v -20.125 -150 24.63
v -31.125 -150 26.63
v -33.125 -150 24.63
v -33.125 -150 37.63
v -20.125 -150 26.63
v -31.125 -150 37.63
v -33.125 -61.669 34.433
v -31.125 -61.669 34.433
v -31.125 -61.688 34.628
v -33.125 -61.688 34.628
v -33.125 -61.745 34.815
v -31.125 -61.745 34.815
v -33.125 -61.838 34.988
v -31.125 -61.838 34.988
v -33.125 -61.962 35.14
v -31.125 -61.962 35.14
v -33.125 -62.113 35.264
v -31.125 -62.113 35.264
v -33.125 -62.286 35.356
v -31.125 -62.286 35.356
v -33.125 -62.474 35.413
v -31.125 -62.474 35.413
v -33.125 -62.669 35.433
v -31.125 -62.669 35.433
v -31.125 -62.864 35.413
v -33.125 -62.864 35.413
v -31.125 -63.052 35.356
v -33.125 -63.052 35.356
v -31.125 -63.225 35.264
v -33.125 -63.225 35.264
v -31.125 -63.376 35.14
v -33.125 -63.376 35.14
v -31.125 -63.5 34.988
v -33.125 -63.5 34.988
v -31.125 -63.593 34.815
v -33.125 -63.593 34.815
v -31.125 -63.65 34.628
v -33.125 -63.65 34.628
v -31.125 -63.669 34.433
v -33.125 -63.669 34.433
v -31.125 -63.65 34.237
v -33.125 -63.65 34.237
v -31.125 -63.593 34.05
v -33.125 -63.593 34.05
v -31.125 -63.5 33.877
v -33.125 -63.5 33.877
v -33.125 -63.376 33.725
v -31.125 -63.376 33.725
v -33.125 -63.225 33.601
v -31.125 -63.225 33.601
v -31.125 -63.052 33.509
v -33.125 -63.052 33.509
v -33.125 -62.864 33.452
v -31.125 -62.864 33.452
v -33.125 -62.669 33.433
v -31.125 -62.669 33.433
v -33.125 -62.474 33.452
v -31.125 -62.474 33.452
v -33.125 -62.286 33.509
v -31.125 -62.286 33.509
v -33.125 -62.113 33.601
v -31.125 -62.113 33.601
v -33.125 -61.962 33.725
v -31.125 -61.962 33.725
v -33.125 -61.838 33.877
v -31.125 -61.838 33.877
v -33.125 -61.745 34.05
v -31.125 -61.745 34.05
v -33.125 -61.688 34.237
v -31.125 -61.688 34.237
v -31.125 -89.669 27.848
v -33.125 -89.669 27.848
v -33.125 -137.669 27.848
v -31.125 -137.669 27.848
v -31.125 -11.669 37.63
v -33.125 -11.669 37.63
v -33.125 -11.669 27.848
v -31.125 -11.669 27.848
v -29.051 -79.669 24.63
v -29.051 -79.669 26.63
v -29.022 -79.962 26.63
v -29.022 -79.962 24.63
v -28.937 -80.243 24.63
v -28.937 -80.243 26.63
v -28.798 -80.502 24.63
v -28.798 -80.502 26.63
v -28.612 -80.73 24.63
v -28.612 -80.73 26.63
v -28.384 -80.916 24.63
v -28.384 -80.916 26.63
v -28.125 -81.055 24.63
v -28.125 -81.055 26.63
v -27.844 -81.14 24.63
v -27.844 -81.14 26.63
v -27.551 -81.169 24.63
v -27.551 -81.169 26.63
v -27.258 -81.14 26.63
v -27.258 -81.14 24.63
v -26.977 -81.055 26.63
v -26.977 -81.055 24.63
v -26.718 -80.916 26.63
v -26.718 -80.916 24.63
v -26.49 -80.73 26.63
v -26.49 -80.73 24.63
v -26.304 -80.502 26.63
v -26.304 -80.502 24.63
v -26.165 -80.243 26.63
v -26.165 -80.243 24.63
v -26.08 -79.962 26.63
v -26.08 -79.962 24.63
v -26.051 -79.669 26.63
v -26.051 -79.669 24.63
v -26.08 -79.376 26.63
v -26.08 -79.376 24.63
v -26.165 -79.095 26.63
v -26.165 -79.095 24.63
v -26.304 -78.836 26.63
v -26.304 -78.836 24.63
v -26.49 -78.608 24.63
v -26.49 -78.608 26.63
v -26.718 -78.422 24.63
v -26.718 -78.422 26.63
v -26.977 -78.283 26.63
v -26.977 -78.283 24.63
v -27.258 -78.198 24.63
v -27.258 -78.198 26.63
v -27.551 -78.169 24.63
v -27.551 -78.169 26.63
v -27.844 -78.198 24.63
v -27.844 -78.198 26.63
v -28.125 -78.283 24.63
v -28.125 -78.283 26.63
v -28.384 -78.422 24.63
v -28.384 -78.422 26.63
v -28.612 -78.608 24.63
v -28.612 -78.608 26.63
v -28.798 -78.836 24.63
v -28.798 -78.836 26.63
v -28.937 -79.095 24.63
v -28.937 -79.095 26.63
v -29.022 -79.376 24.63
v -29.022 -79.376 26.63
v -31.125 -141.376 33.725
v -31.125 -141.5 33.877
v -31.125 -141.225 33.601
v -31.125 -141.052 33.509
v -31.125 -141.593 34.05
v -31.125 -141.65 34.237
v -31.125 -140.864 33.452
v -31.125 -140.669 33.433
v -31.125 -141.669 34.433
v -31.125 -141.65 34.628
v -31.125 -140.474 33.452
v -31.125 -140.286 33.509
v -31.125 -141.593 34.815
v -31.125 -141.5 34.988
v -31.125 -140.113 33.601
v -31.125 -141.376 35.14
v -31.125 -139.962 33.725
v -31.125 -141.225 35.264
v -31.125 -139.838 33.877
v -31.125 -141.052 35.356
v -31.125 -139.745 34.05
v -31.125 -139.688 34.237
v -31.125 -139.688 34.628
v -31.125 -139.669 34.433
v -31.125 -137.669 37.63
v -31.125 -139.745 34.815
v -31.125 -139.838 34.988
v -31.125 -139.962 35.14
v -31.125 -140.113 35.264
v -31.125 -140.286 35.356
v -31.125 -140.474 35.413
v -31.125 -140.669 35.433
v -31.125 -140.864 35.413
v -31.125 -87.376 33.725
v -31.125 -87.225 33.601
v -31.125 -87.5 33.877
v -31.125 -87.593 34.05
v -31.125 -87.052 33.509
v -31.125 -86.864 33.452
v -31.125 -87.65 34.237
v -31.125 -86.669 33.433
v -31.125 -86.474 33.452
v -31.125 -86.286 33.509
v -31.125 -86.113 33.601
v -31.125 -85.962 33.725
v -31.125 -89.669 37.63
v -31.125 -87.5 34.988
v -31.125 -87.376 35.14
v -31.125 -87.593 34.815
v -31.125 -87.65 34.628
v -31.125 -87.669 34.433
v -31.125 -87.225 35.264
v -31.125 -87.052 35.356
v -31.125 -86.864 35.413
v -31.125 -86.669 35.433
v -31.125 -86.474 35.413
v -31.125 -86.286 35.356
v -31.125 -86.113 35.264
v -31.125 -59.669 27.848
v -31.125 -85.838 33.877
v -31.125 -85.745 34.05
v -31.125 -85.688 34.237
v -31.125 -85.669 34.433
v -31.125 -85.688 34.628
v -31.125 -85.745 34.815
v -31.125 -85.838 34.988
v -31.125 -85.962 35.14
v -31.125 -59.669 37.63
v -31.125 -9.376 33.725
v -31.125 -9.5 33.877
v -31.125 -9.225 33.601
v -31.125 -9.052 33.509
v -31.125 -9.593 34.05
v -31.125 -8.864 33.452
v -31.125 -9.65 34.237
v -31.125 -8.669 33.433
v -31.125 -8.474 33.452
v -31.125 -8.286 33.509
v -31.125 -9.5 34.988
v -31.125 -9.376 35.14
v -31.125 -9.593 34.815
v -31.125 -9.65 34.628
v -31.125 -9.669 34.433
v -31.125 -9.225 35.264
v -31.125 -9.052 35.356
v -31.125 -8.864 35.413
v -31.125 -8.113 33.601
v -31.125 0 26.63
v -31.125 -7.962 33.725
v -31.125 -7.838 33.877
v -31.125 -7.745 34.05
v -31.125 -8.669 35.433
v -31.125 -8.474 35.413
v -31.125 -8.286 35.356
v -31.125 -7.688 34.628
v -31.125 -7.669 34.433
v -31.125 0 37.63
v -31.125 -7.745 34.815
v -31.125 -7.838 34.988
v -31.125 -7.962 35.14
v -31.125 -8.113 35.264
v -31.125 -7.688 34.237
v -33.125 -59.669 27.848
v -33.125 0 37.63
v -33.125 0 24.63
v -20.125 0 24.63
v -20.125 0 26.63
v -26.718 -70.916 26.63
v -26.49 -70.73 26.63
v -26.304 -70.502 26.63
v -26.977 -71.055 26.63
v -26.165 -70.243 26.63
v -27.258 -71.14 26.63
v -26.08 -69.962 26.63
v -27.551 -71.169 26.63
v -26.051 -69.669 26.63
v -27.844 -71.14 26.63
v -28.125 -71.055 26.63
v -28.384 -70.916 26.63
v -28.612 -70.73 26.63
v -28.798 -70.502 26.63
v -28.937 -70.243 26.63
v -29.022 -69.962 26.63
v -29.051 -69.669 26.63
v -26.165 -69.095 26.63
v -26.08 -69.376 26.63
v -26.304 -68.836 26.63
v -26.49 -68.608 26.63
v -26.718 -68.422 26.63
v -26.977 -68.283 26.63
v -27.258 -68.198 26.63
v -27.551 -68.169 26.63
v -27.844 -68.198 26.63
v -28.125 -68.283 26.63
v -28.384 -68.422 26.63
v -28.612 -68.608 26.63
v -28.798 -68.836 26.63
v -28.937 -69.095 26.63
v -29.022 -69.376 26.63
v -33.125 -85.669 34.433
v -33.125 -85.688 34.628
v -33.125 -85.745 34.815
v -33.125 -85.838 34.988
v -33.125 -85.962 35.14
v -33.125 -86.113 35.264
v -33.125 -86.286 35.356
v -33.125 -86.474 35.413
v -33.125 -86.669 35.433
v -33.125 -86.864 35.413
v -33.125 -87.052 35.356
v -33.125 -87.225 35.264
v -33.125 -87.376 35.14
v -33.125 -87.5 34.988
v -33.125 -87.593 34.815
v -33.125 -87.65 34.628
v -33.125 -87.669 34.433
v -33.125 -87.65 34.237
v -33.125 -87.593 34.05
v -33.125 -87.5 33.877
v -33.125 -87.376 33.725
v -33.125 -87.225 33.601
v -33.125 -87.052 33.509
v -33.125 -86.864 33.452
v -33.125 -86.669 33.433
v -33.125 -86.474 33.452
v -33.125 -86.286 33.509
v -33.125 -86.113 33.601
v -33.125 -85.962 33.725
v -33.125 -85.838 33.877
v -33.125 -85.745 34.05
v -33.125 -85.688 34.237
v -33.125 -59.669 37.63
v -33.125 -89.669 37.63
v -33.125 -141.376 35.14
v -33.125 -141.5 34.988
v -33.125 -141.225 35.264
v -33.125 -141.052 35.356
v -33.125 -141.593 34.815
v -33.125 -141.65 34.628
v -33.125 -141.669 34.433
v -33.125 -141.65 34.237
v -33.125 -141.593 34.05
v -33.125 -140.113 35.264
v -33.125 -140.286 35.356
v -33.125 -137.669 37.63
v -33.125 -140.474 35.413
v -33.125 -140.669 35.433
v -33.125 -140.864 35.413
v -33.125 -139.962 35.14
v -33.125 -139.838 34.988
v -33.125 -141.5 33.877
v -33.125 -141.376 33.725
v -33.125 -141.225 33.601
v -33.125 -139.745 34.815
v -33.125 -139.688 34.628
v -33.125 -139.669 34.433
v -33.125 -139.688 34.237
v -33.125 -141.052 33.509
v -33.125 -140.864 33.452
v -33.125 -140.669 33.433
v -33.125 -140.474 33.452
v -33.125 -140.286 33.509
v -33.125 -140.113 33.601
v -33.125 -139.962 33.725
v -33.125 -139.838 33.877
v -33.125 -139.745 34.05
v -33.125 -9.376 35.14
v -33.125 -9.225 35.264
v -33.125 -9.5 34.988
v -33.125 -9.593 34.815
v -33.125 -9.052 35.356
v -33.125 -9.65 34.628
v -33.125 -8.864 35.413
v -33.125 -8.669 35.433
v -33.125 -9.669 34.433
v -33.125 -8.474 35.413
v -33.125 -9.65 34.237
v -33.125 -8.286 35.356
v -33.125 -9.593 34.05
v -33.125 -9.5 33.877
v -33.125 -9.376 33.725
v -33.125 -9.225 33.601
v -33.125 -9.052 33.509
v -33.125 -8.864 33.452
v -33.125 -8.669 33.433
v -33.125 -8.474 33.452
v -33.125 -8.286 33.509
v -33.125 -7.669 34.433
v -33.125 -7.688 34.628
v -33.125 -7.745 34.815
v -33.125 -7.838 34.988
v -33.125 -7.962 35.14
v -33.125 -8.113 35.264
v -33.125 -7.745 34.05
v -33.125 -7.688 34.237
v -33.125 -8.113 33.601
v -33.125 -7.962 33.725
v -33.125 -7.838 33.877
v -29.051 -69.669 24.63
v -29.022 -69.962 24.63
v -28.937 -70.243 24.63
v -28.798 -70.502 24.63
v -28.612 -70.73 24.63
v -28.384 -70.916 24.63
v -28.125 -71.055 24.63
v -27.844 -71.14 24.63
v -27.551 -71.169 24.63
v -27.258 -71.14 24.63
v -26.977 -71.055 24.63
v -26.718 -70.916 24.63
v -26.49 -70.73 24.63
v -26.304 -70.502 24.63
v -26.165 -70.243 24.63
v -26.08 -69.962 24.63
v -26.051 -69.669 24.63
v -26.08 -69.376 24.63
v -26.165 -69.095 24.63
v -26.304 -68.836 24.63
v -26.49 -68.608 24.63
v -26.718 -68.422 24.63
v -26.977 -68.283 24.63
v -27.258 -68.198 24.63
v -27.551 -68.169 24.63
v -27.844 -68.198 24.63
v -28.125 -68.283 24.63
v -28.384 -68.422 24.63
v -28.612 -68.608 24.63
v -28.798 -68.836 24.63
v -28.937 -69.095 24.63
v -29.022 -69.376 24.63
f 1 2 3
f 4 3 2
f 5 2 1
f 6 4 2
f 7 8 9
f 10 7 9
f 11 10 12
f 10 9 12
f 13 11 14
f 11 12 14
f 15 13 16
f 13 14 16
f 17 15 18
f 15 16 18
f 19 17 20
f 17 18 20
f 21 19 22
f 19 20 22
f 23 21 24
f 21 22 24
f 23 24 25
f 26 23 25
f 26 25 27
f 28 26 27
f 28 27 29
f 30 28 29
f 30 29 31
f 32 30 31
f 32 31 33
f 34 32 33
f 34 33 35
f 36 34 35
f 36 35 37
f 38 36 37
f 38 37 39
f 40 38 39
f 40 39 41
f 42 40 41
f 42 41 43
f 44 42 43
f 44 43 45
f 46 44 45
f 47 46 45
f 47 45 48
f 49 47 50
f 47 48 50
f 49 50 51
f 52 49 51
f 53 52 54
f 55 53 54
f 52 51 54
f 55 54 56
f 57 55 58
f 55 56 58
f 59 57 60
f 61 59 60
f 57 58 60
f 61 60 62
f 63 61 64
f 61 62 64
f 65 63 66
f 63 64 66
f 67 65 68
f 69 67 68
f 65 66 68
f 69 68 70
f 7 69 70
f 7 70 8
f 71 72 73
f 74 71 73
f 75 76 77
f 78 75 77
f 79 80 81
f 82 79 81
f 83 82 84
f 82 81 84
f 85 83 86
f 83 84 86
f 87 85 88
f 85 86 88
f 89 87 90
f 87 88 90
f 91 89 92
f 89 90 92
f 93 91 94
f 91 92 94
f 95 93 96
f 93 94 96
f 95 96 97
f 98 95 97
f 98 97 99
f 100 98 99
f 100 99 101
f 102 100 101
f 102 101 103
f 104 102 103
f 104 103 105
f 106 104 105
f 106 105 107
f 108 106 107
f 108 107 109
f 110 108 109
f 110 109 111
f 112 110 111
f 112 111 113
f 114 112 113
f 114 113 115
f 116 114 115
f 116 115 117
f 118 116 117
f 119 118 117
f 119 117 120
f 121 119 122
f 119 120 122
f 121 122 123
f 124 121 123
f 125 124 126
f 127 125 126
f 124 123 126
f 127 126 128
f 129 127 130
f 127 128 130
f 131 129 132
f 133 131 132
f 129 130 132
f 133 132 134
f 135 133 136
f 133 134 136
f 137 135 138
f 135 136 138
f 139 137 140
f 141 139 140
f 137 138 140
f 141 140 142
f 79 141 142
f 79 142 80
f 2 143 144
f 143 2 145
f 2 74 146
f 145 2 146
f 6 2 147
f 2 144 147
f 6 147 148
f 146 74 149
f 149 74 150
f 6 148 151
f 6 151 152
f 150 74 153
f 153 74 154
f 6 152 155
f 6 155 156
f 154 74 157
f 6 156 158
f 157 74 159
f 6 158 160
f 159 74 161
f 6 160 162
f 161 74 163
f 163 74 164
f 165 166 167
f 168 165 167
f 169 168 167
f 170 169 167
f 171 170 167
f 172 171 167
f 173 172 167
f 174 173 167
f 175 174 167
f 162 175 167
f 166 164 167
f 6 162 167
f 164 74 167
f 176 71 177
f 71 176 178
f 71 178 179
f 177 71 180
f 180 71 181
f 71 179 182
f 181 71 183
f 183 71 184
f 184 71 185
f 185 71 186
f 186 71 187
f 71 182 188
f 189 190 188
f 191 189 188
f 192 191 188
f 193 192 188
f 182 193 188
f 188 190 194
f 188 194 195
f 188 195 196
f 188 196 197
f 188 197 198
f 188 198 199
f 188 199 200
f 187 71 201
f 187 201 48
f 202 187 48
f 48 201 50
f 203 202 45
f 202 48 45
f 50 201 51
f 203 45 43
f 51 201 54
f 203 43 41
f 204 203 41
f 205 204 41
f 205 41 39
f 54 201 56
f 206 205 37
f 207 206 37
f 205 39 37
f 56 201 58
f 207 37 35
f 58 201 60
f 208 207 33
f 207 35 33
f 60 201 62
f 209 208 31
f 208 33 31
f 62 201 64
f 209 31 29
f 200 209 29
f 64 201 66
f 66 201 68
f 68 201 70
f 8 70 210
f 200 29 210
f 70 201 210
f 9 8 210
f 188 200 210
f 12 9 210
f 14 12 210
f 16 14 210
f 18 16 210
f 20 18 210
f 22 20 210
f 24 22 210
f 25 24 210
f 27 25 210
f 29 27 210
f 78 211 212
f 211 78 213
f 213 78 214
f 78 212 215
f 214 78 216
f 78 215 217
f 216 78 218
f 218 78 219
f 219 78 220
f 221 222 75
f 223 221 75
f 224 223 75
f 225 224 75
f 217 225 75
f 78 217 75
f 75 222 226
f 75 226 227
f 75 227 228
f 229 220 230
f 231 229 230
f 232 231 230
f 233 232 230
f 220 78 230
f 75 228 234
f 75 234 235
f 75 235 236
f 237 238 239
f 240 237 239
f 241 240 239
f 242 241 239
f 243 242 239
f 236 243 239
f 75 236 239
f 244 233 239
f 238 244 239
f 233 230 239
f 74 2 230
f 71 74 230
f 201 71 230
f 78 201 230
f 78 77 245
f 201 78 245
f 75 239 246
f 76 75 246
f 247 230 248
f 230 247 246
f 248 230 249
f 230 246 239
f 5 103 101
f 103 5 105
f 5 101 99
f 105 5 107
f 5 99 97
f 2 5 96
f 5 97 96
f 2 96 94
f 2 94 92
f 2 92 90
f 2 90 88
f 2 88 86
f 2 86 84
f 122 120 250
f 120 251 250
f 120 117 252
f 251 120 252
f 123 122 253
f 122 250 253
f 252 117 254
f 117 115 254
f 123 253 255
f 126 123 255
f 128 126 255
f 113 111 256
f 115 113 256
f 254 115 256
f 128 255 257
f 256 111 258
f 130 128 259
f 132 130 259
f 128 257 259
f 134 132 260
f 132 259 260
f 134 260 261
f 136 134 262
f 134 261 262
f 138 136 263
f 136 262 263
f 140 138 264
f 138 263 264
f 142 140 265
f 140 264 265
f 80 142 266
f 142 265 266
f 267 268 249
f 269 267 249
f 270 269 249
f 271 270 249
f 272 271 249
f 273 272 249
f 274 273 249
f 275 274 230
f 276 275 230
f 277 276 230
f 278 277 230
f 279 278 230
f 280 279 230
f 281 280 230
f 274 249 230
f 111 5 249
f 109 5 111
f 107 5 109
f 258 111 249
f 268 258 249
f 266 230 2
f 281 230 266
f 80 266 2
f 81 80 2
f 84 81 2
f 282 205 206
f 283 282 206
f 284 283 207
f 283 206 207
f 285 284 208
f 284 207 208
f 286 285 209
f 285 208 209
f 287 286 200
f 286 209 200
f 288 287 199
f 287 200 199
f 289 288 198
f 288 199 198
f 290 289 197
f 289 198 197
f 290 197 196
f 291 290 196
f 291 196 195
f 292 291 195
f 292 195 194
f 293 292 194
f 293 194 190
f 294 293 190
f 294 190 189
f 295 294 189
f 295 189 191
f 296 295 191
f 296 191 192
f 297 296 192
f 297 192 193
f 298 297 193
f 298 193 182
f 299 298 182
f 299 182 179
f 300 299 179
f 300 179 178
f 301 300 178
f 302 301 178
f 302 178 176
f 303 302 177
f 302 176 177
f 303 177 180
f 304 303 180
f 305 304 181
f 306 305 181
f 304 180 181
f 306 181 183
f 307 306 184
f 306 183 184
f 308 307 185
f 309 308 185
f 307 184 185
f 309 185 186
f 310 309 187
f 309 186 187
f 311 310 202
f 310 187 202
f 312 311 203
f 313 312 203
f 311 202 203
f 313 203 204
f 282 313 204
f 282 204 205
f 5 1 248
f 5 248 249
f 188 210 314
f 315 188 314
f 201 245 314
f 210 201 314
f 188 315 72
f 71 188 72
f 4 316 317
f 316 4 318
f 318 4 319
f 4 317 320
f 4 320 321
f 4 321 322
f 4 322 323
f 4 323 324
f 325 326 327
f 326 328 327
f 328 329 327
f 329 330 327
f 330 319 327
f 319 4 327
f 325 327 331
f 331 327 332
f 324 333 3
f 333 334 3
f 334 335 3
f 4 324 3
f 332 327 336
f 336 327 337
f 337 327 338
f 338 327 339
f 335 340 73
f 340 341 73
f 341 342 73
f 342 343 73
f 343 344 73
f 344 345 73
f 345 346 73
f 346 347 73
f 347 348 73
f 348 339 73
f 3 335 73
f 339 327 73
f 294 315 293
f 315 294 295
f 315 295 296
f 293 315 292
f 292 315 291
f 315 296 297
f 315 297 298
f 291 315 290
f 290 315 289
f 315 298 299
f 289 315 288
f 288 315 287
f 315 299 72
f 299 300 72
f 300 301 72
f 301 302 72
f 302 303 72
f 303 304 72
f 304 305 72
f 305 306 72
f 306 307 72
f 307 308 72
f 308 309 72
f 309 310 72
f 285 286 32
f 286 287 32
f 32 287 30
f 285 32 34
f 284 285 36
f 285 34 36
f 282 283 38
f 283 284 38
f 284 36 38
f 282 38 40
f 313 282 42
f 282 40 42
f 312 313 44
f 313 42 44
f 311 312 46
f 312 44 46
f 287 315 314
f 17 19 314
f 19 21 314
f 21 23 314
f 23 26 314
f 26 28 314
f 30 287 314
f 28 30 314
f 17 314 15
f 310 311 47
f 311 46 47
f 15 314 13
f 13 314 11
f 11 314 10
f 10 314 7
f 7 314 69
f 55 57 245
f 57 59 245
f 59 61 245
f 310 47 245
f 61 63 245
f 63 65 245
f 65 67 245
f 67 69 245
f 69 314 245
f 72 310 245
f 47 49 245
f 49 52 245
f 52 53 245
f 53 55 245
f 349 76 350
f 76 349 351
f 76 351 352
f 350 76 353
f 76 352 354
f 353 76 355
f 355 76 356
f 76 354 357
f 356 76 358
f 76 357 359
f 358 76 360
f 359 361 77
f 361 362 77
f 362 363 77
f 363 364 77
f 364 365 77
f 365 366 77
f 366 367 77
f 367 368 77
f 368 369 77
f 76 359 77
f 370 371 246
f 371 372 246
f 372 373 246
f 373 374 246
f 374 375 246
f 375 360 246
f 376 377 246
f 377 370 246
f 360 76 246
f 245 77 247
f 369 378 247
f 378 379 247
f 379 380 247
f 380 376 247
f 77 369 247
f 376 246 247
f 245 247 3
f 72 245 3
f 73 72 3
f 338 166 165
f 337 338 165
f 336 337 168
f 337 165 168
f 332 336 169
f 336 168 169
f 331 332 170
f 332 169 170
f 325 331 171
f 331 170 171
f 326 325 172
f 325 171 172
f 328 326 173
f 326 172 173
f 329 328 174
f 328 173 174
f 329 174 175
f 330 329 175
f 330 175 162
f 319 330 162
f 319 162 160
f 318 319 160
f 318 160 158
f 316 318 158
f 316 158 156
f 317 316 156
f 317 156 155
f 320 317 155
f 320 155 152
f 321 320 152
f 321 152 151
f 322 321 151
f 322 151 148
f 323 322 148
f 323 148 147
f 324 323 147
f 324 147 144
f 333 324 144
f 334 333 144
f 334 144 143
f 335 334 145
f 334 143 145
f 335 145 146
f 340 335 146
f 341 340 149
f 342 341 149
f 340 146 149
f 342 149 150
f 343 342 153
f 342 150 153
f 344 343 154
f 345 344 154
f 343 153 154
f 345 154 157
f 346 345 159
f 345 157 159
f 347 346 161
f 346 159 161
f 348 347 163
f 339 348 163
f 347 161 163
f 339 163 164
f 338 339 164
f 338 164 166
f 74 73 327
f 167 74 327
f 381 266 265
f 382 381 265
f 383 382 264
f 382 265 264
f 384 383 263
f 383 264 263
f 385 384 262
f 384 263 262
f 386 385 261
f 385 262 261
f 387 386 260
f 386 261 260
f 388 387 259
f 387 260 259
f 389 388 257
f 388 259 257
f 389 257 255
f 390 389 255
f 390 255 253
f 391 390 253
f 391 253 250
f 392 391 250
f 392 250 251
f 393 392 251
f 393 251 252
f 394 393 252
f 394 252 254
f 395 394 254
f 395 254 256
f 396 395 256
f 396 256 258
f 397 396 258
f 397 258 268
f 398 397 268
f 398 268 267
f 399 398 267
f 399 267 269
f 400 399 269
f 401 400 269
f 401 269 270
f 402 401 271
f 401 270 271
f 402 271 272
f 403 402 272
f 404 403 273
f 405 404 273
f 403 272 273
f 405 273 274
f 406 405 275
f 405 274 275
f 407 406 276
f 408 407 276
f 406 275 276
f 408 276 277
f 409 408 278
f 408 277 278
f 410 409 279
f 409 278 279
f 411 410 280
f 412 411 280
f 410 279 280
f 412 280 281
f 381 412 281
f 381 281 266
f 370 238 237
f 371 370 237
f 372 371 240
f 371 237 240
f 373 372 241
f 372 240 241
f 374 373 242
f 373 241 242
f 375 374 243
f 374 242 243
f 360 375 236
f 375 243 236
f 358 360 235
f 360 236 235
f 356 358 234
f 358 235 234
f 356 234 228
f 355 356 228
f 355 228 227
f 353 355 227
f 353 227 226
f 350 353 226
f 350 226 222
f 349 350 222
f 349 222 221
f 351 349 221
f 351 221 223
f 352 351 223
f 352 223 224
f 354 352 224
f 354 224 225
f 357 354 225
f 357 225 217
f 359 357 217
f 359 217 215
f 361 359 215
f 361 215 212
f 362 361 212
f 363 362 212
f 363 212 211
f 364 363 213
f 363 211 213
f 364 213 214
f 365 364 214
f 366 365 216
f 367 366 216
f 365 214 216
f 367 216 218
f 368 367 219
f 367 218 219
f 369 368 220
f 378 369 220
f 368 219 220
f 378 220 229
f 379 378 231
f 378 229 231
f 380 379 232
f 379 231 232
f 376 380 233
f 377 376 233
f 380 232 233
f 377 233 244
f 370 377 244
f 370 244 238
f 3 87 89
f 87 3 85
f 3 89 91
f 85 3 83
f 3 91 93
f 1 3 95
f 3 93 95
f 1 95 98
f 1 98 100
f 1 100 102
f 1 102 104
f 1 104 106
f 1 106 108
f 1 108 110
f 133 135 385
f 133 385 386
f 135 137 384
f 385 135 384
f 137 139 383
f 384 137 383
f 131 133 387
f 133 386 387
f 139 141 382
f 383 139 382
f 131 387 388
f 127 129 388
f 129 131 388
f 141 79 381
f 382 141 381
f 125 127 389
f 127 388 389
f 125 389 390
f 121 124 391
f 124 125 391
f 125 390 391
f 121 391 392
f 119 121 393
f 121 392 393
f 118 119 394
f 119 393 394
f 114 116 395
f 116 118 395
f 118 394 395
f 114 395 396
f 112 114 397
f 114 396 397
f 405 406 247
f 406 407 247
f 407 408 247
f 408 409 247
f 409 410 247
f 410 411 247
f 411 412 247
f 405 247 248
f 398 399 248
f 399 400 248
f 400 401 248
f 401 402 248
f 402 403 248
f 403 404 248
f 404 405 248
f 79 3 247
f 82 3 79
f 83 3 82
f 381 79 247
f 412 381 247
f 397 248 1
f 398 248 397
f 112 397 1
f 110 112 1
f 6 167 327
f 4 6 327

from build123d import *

# Parameters (mm, degrees)
F1_DEPTH = 150
F3_D     = 3
F4_W     = 48
F4_H     = 6.5847709775
F4_H_2   = 3.1977064162
F5_DEPTH = 78
F6_D     = 2


with BuildPart() as f1:
    # F0 (on Front) → F1 (new body)
    with BuildSketch(Plane.XZ):
        Polygon((-31.1246368587, 37.6302368194), (-33.1246368587, 37.6302368194), (-33.1246368587, 24.6302368194), (-20.1246368587, 24.6302368194), (-20.1246368587, 26.6302368194), (-31.1246368587, 26.6302368194), align=None)
    extrude(amount=F1_DEPTH)

    # F3 (through all)
    with Locations(Plane(origin=(0, 0, 24.6302368194), x_dir=(1, 0, 0), z_dir=(0, 0, -1))):
        with Locations((-27.5510344654, 69.6690183878), (-27.5510344654, 79.6690183878)):
            Hole(F3_D / 2)

    # F4 (on face) → F5 (cut)
    with BuildSketch(Plane(origin=(-33.1246368587, 0, 0), x_dir=(0, -1, 0), z_dir=(-1, 0, 0))):
        with Locations((35.6690183878, 31.1401449144)):
            Rectangle(F4_W, F4_H)
        with Locations((35.6690183878, 36.0313836113)):
            Rectangle(F4_W, F4_H_2)
        with Locations((113.6690183878, 36.0313836113)):
            Rectangle(F4_W, F4_H_2)
        with Locations((113.6690183878, 31.1401449144)):
            Rectangle(F4_W, F4_H)
    extrude(amount=-F5_DEPTH, mode=Mode.SUBTRACT)

    # F6 (through all)
    with Locations(Plane(origin=(-33.1246368587, 0, 0), x_dir=(0, -1, 0), z_dir=(-1, 0, 0))):
        with Locations((8.6690183878, 34.4325304031), (62.6690183878, 34.4325304031), (86.6690183878, 34.4325304031), (140.6690183878, 34.4325304031)):
            Hole(F6_D / 2)


solid = f1.part
